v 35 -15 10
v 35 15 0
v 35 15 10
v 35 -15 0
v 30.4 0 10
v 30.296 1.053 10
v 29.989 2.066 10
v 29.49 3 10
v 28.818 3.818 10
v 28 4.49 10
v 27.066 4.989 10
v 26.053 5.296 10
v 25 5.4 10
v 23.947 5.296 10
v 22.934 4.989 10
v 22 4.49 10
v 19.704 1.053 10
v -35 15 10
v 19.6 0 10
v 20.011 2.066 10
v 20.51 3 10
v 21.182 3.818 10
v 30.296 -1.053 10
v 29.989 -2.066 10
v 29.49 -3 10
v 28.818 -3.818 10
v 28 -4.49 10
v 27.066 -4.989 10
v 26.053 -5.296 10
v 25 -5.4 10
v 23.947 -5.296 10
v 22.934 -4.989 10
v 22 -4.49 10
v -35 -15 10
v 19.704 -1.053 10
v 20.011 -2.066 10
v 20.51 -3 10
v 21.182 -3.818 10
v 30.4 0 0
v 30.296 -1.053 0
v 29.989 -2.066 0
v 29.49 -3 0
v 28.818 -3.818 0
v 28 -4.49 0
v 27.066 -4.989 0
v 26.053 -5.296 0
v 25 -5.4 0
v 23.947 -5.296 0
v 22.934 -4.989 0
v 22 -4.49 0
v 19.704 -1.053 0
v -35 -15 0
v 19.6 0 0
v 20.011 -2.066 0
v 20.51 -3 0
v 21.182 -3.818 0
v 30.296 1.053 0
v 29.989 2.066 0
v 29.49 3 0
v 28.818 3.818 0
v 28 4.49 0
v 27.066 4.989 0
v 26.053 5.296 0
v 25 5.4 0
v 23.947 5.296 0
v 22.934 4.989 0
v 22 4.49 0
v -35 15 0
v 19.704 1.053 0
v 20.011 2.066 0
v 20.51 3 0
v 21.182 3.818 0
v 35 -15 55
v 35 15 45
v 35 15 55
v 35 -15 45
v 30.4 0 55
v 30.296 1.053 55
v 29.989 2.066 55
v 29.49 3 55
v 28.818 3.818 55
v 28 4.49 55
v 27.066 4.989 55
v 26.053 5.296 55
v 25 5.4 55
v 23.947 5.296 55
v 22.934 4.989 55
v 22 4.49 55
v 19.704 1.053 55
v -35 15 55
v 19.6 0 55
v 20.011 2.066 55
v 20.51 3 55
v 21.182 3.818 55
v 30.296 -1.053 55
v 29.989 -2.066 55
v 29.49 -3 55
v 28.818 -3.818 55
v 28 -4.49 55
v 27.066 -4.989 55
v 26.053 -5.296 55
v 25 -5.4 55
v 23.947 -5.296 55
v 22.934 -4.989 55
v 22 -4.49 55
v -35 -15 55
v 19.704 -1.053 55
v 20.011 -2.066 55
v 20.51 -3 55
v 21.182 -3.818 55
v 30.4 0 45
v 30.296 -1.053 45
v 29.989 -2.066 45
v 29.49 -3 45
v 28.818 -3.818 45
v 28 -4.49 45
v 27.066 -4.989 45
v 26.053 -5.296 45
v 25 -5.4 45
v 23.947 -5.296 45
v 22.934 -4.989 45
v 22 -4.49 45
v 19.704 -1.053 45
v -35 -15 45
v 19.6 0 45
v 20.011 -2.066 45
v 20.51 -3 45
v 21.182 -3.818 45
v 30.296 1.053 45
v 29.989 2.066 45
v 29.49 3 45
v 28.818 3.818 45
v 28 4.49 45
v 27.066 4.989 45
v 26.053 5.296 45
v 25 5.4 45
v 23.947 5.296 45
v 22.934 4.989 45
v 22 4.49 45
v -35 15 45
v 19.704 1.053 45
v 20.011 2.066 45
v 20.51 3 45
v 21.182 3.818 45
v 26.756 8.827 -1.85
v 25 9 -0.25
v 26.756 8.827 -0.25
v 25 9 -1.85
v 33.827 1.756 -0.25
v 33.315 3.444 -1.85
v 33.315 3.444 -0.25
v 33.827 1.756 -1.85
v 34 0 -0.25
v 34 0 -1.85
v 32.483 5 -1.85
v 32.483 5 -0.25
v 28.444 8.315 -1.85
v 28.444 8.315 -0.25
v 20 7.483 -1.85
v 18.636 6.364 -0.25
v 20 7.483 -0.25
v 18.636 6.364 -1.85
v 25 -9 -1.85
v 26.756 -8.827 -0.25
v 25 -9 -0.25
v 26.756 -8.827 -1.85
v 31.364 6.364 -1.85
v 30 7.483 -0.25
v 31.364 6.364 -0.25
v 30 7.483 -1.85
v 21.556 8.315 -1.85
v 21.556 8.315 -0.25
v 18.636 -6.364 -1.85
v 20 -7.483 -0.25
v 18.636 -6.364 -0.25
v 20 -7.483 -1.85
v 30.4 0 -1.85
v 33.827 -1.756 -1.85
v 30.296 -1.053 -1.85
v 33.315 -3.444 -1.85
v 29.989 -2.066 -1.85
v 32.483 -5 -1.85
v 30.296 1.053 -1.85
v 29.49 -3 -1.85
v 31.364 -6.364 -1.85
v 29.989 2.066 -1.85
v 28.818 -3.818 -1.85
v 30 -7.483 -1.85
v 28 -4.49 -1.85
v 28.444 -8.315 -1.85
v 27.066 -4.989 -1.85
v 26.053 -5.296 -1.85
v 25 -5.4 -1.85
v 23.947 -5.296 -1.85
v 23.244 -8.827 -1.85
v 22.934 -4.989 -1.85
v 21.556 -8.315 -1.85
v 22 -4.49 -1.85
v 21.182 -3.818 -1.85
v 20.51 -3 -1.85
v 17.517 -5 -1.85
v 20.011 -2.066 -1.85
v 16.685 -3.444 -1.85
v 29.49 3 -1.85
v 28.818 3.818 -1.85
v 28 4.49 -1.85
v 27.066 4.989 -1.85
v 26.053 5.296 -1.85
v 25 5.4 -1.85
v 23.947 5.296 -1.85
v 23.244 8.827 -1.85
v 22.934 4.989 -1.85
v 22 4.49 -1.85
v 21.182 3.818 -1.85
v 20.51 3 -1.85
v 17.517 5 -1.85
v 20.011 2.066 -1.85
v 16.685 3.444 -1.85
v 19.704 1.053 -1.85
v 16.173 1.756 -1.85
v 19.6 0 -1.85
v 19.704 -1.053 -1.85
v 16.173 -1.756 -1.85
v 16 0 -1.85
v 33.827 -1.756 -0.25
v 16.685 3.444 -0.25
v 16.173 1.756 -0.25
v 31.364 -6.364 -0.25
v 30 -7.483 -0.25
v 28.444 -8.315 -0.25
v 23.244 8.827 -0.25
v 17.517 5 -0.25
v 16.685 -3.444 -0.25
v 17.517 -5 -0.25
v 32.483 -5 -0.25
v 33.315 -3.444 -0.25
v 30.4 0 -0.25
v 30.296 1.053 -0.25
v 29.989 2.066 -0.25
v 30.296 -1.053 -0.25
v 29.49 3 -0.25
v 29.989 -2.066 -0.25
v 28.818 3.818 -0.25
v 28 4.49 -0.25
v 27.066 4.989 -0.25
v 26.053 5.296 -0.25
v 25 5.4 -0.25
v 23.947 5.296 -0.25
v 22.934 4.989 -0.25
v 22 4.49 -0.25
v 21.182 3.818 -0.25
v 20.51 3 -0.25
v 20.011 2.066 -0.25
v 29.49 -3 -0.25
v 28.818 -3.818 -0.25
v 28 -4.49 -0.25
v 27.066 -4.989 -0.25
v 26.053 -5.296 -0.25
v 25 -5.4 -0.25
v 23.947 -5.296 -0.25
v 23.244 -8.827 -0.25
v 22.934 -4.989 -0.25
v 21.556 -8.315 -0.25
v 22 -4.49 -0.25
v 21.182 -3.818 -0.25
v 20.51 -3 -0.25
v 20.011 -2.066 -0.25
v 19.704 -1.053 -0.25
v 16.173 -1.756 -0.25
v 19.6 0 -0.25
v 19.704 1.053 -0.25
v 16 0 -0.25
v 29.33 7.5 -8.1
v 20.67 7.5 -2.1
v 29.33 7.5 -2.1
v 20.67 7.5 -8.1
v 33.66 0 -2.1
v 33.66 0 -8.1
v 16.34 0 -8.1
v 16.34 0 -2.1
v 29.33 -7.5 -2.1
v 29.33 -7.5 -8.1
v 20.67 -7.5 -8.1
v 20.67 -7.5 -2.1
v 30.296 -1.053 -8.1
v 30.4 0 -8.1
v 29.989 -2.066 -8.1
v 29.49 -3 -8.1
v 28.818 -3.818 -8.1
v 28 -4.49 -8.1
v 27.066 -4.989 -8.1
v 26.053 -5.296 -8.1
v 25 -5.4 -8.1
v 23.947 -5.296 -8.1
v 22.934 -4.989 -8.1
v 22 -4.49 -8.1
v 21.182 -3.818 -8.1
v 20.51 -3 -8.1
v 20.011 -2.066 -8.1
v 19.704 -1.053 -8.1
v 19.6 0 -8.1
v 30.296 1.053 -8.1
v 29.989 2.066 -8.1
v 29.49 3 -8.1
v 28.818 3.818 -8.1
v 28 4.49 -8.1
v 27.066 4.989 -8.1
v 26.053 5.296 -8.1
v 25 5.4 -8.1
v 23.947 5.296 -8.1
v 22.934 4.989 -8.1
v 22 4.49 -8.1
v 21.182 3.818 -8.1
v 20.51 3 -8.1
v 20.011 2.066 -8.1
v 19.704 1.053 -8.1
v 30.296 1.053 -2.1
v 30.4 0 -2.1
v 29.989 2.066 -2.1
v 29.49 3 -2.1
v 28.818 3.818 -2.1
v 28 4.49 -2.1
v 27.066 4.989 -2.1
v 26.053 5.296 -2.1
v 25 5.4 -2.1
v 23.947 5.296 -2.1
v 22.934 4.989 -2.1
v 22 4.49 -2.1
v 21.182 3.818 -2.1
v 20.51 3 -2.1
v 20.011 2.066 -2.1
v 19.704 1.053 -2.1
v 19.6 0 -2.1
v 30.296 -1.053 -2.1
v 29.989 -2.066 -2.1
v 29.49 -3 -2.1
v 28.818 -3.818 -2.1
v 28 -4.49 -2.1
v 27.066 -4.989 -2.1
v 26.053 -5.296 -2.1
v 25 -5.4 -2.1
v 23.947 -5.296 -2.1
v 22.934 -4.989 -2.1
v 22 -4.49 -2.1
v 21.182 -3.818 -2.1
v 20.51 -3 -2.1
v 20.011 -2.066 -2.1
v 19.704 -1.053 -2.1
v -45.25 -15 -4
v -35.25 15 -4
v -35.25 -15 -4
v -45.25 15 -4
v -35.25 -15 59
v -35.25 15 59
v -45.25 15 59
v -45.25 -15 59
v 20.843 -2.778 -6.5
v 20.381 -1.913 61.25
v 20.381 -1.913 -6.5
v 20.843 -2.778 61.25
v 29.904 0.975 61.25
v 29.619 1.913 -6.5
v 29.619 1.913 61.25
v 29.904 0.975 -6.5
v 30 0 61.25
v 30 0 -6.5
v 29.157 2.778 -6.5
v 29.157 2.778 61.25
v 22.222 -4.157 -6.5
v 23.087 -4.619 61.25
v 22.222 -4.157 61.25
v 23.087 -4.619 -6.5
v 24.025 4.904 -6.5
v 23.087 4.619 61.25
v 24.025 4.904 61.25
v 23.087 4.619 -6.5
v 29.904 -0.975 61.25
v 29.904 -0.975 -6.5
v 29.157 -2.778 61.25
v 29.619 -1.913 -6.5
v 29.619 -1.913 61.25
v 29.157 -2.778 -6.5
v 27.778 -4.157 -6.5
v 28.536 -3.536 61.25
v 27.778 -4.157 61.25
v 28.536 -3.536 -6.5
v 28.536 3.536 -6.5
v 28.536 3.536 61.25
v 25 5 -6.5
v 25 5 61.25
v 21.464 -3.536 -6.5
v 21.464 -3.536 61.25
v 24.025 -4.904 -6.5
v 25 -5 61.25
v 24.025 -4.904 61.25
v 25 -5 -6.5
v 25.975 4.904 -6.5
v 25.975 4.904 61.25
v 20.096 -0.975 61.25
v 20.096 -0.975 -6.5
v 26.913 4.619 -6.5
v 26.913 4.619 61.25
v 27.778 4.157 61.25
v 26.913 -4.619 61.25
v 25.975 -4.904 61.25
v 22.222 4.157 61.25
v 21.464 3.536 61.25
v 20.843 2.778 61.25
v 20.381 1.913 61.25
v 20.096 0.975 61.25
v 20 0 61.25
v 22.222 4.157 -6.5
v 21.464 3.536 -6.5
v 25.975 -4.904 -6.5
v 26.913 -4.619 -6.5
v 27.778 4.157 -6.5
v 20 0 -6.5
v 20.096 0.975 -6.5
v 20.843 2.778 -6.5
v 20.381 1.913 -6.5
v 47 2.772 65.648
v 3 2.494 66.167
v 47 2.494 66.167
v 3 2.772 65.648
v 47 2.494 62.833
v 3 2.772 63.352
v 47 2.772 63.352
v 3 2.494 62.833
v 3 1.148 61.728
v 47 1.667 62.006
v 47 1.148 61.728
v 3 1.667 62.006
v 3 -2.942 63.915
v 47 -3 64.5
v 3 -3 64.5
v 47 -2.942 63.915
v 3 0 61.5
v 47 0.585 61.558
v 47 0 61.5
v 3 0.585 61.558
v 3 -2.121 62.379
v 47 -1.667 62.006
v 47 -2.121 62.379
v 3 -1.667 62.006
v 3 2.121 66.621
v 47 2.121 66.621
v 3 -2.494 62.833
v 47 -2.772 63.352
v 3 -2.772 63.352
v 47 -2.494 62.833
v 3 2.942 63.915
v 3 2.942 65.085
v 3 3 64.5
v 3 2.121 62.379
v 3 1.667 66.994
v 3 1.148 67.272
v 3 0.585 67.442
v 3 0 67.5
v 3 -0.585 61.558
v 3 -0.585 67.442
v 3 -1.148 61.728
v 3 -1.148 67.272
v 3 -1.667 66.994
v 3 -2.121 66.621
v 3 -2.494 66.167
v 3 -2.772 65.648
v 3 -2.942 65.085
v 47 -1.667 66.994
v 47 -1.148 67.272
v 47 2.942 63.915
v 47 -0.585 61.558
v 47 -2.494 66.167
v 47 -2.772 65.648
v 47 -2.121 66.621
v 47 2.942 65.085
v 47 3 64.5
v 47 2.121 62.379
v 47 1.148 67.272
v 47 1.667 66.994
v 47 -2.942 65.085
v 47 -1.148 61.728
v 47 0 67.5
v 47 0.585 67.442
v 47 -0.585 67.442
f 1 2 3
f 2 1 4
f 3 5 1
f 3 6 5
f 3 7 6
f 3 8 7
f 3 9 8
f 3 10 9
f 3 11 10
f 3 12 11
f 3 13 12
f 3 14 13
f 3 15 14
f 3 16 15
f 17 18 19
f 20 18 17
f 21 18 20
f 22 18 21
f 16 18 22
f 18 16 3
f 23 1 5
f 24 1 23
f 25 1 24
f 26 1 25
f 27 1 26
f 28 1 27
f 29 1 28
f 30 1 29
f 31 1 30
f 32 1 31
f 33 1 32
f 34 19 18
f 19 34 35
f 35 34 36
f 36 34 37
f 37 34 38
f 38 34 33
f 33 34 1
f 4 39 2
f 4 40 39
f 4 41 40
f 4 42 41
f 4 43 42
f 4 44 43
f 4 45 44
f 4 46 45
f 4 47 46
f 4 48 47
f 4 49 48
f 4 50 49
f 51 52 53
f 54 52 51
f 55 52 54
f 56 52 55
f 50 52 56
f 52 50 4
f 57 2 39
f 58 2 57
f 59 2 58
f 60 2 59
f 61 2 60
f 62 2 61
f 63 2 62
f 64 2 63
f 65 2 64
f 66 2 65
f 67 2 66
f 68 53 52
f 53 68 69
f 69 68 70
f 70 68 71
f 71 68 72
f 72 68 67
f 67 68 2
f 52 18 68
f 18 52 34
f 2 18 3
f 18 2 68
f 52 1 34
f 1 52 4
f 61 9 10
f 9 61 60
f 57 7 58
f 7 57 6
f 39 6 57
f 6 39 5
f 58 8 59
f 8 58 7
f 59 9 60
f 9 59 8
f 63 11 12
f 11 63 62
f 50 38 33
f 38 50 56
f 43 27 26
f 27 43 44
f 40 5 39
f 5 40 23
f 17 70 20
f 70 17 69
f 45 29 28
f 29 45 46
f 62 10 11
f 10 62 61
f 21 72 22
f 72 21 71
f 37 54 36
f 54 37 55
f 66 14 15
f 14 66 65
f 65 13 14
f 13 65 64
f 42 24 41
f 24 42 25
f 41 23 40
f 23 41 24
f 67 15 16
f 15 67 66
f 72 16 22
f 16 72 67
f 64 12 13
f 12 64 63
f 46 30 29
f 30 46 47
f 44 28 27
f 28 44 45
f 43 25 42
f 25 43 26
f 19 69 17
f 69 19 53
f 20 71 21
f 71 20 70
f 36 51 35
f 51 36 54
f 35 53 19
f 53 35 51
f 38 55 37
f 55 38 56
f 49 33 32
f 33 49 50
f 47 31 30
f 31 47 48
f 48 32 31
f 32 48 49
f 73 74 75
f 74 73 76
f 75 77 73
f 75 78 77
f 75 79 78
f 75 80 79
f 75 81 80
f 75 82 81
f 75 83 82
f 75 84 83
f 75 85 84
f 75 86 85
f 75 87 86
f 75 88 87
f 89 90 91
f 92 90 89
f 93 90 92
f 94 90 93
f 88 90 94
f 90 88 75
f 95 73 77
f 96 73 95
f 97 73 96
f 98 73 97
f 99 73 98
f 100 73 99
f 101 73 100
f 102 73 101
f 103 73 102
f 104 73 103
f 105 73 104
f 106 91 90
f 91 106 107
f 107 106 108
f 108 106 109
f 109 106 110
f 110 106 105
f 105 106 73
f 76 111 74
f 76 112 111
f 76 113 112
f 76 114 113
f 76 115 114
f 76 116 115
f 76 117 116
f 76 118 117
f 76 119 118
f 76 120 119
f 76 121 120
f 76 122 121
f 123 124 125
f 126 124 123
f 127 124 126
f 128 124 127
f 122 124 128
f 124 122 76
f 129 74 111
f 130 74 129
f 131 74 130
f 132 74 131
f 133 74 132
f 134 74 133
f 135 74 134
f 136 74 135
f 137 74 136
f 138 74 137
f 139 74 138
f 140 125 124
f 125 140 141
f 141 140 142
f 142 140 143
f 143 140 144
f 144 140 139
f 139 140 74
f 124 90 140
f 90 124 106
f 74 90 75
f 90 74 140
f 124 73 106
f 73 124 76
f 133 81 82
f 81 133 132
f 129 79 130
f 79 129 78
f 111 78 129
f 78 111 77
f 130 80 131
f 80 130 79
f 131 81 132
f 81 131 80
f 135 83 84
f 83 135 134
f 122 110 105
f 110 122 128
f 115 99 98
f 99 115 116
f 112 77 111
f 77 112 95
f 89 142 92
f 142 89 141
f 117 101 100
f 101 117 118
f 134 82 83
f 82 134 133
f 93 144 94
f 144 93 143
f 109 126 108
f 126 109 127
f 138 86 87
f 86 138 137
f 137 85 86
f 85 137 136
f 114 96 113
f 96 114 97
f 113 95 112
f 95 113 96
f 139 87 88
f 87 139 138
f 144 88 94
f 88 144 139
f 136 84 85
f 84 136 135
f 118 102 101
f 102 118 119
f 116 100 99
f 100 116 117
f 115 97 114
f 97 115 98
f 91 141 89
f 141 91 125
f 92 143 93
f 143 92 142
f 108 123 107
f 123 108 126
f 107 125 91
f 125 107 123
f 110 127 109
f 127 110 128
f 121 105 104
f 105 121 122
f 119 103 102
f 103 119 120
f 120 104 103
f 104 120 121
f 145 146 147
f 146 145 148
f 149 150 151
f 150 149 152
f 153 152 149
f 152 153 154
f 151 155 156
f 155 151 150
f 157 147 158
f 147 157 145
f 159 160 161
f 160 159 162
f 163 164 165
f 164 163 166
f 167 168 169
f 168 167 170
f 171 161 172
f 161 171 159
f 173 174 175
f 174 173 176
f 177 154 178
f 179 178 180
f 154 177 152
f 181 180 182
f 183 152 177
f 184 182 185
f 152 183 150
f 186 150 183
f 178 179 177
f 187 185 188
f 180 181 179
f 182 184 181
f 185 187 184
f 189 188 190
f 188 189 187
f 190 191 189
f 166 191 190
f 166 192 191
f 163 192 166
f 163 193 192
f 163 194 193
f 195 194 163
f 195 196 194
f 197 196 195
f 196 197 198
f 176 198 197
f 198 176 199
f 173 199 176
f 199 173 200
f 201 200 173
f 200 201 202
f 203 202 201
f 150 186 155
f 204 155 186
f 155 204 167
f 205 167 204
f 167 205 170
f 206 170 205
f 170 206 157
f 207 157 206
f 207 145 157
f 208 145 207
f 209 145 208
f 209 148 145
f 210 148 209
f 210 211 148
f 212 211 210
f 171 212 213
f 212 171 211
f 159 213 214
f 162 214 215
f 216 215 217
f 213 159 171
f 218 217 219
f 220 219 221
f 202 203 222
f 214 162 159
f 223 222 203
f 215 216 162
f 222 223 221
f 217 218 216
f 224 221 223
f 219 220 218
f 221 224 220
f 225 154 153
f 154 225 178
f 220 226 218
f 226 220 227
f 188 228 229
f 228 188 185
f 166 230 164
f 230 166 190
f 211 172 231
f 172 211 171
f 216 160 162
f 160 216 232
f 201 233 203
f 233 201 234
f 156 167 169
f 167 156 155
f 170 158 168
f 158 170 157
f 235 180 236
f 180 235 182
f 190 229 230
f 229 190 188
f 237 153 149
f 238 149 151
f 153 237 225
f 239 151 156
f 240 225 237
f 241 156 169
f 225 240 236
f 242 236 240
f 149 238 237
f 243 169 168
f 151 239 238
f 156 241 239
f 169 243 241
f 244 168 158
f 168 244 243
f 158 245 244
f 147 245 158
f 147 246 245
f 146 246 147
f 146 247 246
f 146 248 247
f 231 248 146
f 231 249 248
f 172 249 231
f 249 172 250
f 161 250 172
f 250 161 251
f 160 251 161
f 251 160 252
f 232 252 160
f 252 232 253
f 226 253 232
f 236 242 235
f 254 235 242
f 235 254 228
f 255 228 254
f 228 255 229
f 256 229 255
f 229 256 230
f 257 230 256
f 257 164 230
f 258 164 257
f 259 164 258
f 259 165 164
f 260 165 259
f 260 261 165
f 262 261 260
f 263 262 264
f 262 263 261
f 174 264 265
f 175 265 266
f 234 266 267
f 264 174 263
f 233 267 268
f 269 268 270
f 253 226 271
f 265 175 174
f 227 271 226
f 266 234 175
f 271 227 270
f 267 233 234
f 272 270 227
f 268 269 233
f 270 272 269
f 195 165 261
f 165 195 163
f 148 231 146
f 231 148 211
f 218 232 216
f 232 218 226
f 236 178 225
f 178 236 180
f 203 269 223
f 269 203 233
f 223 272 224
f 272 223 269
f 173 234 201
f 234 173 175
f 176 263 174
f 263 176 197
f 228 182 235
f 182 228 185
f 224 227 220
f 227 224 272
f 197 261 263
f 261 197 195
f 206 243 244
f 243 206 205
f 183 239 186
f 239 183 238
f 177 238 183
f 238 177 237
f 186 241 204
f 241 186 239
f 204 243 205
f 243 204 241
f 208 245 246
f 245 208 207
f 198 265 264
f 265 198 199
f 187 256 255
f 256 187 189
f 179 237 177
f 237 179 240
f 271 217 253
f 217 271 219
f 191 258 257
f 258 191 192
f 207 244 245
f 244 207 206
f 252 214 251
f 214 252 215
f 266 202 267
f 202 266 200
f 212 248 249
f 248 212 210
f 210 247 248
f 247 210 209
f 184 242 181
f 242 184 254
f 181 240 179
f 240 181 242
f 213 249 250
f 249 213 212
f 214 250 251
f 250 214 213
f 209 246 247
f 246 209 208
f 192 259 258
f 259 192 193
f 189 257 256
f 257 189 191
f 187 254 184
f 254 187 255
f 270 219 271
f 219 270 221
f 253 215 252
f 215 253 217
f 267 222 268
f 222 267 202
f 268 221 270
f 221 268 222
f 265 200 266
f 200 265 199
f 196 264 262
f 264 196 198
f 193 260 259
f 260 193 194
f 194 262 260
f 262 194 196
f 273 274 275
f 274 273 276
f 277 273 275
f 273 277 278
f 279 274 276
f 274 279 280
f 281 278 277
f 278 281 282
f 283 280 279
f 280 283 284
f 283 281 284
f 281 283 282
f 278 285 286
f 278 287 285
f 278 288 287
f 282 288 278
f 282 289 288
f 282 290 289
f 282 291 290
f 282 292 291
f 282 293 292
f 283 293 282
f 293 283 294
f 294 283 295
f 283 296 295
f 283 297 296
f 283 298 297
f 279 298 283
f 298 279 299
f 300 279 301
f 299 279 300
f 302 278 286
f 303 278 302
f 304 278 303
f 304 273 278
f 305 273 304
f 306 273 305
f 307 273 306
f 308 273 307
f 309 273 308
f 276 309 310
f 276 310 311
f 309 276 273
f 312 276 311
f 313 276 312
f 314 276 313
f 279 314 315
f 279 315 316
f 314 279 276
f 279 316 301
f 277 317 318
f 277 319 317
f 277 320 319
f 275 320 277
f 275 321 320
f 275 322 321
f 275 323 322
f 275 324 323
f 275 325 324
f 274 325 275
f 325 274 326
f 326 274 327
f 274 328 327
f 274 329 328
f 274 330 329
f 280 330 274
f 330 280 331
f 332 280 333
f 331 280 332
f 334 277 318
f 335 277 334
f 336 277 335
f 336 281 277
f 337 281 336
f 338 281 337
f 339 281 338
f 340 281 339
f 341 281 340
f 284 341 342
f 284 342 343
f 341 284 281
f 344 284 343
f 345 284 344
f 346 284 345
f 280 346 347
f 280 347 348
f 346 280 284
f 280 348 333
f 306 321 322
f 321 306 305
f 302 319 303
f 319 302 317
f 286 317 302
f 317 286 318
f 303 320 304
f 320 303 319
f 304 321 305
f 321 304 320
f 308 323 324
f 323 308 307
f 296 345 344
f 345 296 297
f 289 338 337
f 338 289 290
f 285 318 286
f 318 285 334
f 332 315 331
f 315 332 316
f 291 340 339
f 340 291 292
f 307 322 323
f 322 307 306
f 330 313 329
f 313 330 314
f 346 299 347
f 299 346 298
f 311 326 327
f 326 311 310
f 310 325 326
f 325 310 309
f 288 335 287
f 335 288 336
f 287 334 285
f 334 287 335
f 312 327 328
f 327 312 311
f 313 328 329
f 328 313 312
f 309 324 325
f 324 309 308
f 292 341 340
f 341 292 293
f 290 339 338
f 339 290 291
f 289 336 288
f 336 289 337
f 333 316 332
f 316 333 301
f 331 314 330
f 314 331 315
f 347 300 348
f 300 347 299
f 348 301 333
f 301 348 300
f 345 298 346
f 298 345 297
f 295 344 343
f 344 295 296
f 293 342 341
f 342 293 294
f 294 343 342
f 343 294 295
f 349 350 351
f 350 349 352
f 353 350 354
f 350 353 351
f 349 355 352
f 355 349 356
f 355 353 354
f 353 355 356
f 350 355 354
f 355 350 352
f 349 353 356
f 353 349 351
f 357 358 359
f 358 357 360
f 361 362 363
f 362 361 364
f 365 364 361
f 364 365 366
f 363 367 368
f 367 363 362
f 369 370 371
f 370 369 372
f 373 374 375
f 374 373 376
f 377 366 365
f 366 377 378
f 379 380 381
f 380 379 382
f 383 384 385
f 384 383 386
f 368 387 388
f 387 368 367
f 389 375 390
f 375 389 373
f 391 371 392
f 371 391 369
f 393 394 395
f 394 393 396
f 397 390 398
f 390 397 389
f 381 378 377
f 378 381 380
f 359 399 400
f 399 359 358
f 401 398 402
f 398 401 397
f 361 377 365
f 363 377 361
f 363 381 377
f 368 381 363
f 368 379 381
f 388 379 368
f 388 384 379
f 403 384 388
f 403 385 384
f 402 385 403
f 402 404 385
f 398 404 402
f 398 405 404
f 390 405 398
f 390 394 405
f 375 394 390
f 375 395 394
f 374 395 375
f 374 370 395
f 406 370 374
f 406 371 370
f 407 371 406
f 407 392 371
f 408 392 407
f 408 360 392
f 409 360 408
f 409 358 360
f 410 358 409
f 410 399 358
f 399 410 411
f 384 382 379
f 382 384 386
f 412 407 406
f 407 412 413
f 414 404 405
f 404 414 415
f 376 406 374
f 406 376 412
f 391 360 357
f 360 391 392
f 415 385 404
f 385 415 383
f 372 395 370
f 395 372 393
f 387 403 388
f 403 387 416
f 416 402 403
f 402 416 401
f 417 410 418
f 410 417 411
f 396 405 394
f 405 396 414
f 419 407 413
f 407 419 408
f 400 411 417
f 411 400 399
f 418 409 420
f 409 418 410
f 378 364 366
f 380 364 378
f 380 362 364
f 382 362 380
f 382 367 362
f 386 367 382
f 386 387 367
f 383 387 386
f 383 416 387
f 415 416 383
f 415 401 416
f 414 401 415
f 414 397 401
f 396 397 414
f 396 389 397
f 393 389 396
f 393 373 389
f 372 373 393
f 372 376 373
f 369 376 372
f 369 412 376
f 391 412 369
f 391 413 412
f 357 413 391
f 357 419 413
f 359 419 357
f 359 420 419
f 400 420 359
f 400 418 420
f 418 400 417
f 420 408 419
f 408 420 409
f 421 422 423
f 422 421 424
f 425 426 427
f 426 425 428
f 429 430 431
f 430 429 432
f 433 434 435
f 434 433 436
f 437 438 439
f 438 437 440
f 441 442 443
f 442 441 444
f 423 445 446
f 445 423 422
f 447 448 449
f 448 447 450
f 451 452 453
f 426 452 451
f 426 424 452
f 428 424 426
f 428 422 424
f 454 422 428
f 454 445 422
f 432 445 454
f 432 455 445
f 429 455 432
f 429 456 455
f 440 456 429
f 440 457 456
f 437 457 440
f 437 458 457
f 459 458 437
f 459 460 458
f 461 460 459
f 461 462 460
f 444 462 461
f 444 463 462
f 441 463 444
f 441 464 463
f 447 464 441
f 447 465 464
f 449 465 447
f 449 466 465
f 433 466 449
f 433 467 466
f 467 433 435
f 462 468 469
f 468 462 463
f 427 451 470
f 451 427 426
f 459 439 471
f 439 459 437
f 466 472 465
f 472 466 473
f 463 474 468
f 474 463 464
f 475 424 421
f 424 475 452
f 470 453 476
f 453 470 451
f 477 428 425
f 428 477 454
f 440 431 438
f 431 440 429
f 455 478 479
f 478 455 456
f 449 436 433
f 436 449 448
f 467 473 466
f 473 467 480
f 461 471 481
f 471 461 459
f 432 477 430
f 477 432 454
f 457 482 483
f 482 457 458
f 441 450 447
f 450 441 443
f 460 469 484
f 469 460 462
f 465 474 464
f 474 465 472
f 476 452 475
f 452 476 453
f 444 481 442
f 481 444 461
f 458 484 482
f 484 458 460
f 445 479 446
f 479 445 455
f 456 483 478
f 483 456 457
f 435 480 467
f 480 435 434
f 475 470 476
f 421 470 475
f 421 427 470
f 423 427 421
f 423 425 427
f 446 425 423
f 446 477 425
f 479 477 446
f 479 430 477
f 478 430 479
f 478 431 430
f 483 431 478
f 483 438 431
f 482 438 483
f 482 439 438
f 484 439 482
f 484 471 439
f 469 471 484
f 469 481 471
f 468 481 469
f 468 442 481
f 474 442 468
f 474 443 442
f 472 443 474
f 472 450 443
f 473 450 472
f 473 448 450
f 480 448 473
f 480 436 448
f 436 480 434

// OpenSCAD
$fn = 32;

// ------------------------------------------------------------------------
// C clamp: throat 45 mm, screw d10
// Every part is its own module, assembly() places every instance.
// ------------------------------------------------------------------------

// --- part 1 ---
module clamp_arm() {
  difference() {
    translate([-35, -15, 0]) cube([70, 30, 10]);
    translate([25, 0, -1]) cylinder(h = 12, d = 10.8);
  }
}

// --- part 2 ---
module clamp_spine() {
  difference() {
    translate([-31.5, -15, 0]) cube([63, 30, 10]);
  }
}

// --- part 3 ---
module clamp_screw() {
  translate([0, 0, -33.875]) cylinder(h = 67.75, d = 10);
}

// --- part 4 ---
module clamp_washer() {
  difference() {
      translate([0, 0, 0]) cylinder(h = 1.6, d = 18);
      translate([0, 0, -1]) cylinder(h = 3.6, d = 10.8);
    }
}

// --- part 5 ---
module clamp_nut() {
  difference() {
    linear_extrude(height = 6) polygon(points = [[8.66, 0], [4.33, 7.5], [-4.33, 7.5], [-8.66, 0], [-4.33, -7.5], [4.33, -7.5]]);
    translate([0, 0, -1]) cylinder(h = 8, d = 10.8);
  }
}

// --- part 6 ---
module tommy_bar() {
  translate([0, 0, -22]) cylinder(h = 44, d = 6);
}

// --- assembly ---
module assembly() {
  color([0.80, 0.24, 0.20]) translate([0, 0, 0]) rotate([0, 0, 0]) clamp_arm();
  color([0.20, 0.45, 0.75]) translate([0, 0, 45]) rotate([0, 0, 0]) clamp_arm();
  color([0.25, 0.62, 0.32]) translate([-45.25, 0, 27.5]) rotate([0, 90, 0]) clamp_spine();
  color([0.92, 0.70, 0.18]) translate([25, 0, 27.375]) rotate([0, 0, 0]) clamp_screw();
  color([0.58, 0.35, 0.70]) translate([25, 0, -1.85]) rotate([0, 0, 0]) clamp_washer();
  color([0.16, 0.66, 0.66]) translate([25, 0, -8.1]) rotate([0, 0, 0]) clamp_nut();
  color([0.85, 0.48, 0.18]) translate([25, 0, 64.5]) rotate([0, 90, 0]) tommy_bar();
}

assembly();
